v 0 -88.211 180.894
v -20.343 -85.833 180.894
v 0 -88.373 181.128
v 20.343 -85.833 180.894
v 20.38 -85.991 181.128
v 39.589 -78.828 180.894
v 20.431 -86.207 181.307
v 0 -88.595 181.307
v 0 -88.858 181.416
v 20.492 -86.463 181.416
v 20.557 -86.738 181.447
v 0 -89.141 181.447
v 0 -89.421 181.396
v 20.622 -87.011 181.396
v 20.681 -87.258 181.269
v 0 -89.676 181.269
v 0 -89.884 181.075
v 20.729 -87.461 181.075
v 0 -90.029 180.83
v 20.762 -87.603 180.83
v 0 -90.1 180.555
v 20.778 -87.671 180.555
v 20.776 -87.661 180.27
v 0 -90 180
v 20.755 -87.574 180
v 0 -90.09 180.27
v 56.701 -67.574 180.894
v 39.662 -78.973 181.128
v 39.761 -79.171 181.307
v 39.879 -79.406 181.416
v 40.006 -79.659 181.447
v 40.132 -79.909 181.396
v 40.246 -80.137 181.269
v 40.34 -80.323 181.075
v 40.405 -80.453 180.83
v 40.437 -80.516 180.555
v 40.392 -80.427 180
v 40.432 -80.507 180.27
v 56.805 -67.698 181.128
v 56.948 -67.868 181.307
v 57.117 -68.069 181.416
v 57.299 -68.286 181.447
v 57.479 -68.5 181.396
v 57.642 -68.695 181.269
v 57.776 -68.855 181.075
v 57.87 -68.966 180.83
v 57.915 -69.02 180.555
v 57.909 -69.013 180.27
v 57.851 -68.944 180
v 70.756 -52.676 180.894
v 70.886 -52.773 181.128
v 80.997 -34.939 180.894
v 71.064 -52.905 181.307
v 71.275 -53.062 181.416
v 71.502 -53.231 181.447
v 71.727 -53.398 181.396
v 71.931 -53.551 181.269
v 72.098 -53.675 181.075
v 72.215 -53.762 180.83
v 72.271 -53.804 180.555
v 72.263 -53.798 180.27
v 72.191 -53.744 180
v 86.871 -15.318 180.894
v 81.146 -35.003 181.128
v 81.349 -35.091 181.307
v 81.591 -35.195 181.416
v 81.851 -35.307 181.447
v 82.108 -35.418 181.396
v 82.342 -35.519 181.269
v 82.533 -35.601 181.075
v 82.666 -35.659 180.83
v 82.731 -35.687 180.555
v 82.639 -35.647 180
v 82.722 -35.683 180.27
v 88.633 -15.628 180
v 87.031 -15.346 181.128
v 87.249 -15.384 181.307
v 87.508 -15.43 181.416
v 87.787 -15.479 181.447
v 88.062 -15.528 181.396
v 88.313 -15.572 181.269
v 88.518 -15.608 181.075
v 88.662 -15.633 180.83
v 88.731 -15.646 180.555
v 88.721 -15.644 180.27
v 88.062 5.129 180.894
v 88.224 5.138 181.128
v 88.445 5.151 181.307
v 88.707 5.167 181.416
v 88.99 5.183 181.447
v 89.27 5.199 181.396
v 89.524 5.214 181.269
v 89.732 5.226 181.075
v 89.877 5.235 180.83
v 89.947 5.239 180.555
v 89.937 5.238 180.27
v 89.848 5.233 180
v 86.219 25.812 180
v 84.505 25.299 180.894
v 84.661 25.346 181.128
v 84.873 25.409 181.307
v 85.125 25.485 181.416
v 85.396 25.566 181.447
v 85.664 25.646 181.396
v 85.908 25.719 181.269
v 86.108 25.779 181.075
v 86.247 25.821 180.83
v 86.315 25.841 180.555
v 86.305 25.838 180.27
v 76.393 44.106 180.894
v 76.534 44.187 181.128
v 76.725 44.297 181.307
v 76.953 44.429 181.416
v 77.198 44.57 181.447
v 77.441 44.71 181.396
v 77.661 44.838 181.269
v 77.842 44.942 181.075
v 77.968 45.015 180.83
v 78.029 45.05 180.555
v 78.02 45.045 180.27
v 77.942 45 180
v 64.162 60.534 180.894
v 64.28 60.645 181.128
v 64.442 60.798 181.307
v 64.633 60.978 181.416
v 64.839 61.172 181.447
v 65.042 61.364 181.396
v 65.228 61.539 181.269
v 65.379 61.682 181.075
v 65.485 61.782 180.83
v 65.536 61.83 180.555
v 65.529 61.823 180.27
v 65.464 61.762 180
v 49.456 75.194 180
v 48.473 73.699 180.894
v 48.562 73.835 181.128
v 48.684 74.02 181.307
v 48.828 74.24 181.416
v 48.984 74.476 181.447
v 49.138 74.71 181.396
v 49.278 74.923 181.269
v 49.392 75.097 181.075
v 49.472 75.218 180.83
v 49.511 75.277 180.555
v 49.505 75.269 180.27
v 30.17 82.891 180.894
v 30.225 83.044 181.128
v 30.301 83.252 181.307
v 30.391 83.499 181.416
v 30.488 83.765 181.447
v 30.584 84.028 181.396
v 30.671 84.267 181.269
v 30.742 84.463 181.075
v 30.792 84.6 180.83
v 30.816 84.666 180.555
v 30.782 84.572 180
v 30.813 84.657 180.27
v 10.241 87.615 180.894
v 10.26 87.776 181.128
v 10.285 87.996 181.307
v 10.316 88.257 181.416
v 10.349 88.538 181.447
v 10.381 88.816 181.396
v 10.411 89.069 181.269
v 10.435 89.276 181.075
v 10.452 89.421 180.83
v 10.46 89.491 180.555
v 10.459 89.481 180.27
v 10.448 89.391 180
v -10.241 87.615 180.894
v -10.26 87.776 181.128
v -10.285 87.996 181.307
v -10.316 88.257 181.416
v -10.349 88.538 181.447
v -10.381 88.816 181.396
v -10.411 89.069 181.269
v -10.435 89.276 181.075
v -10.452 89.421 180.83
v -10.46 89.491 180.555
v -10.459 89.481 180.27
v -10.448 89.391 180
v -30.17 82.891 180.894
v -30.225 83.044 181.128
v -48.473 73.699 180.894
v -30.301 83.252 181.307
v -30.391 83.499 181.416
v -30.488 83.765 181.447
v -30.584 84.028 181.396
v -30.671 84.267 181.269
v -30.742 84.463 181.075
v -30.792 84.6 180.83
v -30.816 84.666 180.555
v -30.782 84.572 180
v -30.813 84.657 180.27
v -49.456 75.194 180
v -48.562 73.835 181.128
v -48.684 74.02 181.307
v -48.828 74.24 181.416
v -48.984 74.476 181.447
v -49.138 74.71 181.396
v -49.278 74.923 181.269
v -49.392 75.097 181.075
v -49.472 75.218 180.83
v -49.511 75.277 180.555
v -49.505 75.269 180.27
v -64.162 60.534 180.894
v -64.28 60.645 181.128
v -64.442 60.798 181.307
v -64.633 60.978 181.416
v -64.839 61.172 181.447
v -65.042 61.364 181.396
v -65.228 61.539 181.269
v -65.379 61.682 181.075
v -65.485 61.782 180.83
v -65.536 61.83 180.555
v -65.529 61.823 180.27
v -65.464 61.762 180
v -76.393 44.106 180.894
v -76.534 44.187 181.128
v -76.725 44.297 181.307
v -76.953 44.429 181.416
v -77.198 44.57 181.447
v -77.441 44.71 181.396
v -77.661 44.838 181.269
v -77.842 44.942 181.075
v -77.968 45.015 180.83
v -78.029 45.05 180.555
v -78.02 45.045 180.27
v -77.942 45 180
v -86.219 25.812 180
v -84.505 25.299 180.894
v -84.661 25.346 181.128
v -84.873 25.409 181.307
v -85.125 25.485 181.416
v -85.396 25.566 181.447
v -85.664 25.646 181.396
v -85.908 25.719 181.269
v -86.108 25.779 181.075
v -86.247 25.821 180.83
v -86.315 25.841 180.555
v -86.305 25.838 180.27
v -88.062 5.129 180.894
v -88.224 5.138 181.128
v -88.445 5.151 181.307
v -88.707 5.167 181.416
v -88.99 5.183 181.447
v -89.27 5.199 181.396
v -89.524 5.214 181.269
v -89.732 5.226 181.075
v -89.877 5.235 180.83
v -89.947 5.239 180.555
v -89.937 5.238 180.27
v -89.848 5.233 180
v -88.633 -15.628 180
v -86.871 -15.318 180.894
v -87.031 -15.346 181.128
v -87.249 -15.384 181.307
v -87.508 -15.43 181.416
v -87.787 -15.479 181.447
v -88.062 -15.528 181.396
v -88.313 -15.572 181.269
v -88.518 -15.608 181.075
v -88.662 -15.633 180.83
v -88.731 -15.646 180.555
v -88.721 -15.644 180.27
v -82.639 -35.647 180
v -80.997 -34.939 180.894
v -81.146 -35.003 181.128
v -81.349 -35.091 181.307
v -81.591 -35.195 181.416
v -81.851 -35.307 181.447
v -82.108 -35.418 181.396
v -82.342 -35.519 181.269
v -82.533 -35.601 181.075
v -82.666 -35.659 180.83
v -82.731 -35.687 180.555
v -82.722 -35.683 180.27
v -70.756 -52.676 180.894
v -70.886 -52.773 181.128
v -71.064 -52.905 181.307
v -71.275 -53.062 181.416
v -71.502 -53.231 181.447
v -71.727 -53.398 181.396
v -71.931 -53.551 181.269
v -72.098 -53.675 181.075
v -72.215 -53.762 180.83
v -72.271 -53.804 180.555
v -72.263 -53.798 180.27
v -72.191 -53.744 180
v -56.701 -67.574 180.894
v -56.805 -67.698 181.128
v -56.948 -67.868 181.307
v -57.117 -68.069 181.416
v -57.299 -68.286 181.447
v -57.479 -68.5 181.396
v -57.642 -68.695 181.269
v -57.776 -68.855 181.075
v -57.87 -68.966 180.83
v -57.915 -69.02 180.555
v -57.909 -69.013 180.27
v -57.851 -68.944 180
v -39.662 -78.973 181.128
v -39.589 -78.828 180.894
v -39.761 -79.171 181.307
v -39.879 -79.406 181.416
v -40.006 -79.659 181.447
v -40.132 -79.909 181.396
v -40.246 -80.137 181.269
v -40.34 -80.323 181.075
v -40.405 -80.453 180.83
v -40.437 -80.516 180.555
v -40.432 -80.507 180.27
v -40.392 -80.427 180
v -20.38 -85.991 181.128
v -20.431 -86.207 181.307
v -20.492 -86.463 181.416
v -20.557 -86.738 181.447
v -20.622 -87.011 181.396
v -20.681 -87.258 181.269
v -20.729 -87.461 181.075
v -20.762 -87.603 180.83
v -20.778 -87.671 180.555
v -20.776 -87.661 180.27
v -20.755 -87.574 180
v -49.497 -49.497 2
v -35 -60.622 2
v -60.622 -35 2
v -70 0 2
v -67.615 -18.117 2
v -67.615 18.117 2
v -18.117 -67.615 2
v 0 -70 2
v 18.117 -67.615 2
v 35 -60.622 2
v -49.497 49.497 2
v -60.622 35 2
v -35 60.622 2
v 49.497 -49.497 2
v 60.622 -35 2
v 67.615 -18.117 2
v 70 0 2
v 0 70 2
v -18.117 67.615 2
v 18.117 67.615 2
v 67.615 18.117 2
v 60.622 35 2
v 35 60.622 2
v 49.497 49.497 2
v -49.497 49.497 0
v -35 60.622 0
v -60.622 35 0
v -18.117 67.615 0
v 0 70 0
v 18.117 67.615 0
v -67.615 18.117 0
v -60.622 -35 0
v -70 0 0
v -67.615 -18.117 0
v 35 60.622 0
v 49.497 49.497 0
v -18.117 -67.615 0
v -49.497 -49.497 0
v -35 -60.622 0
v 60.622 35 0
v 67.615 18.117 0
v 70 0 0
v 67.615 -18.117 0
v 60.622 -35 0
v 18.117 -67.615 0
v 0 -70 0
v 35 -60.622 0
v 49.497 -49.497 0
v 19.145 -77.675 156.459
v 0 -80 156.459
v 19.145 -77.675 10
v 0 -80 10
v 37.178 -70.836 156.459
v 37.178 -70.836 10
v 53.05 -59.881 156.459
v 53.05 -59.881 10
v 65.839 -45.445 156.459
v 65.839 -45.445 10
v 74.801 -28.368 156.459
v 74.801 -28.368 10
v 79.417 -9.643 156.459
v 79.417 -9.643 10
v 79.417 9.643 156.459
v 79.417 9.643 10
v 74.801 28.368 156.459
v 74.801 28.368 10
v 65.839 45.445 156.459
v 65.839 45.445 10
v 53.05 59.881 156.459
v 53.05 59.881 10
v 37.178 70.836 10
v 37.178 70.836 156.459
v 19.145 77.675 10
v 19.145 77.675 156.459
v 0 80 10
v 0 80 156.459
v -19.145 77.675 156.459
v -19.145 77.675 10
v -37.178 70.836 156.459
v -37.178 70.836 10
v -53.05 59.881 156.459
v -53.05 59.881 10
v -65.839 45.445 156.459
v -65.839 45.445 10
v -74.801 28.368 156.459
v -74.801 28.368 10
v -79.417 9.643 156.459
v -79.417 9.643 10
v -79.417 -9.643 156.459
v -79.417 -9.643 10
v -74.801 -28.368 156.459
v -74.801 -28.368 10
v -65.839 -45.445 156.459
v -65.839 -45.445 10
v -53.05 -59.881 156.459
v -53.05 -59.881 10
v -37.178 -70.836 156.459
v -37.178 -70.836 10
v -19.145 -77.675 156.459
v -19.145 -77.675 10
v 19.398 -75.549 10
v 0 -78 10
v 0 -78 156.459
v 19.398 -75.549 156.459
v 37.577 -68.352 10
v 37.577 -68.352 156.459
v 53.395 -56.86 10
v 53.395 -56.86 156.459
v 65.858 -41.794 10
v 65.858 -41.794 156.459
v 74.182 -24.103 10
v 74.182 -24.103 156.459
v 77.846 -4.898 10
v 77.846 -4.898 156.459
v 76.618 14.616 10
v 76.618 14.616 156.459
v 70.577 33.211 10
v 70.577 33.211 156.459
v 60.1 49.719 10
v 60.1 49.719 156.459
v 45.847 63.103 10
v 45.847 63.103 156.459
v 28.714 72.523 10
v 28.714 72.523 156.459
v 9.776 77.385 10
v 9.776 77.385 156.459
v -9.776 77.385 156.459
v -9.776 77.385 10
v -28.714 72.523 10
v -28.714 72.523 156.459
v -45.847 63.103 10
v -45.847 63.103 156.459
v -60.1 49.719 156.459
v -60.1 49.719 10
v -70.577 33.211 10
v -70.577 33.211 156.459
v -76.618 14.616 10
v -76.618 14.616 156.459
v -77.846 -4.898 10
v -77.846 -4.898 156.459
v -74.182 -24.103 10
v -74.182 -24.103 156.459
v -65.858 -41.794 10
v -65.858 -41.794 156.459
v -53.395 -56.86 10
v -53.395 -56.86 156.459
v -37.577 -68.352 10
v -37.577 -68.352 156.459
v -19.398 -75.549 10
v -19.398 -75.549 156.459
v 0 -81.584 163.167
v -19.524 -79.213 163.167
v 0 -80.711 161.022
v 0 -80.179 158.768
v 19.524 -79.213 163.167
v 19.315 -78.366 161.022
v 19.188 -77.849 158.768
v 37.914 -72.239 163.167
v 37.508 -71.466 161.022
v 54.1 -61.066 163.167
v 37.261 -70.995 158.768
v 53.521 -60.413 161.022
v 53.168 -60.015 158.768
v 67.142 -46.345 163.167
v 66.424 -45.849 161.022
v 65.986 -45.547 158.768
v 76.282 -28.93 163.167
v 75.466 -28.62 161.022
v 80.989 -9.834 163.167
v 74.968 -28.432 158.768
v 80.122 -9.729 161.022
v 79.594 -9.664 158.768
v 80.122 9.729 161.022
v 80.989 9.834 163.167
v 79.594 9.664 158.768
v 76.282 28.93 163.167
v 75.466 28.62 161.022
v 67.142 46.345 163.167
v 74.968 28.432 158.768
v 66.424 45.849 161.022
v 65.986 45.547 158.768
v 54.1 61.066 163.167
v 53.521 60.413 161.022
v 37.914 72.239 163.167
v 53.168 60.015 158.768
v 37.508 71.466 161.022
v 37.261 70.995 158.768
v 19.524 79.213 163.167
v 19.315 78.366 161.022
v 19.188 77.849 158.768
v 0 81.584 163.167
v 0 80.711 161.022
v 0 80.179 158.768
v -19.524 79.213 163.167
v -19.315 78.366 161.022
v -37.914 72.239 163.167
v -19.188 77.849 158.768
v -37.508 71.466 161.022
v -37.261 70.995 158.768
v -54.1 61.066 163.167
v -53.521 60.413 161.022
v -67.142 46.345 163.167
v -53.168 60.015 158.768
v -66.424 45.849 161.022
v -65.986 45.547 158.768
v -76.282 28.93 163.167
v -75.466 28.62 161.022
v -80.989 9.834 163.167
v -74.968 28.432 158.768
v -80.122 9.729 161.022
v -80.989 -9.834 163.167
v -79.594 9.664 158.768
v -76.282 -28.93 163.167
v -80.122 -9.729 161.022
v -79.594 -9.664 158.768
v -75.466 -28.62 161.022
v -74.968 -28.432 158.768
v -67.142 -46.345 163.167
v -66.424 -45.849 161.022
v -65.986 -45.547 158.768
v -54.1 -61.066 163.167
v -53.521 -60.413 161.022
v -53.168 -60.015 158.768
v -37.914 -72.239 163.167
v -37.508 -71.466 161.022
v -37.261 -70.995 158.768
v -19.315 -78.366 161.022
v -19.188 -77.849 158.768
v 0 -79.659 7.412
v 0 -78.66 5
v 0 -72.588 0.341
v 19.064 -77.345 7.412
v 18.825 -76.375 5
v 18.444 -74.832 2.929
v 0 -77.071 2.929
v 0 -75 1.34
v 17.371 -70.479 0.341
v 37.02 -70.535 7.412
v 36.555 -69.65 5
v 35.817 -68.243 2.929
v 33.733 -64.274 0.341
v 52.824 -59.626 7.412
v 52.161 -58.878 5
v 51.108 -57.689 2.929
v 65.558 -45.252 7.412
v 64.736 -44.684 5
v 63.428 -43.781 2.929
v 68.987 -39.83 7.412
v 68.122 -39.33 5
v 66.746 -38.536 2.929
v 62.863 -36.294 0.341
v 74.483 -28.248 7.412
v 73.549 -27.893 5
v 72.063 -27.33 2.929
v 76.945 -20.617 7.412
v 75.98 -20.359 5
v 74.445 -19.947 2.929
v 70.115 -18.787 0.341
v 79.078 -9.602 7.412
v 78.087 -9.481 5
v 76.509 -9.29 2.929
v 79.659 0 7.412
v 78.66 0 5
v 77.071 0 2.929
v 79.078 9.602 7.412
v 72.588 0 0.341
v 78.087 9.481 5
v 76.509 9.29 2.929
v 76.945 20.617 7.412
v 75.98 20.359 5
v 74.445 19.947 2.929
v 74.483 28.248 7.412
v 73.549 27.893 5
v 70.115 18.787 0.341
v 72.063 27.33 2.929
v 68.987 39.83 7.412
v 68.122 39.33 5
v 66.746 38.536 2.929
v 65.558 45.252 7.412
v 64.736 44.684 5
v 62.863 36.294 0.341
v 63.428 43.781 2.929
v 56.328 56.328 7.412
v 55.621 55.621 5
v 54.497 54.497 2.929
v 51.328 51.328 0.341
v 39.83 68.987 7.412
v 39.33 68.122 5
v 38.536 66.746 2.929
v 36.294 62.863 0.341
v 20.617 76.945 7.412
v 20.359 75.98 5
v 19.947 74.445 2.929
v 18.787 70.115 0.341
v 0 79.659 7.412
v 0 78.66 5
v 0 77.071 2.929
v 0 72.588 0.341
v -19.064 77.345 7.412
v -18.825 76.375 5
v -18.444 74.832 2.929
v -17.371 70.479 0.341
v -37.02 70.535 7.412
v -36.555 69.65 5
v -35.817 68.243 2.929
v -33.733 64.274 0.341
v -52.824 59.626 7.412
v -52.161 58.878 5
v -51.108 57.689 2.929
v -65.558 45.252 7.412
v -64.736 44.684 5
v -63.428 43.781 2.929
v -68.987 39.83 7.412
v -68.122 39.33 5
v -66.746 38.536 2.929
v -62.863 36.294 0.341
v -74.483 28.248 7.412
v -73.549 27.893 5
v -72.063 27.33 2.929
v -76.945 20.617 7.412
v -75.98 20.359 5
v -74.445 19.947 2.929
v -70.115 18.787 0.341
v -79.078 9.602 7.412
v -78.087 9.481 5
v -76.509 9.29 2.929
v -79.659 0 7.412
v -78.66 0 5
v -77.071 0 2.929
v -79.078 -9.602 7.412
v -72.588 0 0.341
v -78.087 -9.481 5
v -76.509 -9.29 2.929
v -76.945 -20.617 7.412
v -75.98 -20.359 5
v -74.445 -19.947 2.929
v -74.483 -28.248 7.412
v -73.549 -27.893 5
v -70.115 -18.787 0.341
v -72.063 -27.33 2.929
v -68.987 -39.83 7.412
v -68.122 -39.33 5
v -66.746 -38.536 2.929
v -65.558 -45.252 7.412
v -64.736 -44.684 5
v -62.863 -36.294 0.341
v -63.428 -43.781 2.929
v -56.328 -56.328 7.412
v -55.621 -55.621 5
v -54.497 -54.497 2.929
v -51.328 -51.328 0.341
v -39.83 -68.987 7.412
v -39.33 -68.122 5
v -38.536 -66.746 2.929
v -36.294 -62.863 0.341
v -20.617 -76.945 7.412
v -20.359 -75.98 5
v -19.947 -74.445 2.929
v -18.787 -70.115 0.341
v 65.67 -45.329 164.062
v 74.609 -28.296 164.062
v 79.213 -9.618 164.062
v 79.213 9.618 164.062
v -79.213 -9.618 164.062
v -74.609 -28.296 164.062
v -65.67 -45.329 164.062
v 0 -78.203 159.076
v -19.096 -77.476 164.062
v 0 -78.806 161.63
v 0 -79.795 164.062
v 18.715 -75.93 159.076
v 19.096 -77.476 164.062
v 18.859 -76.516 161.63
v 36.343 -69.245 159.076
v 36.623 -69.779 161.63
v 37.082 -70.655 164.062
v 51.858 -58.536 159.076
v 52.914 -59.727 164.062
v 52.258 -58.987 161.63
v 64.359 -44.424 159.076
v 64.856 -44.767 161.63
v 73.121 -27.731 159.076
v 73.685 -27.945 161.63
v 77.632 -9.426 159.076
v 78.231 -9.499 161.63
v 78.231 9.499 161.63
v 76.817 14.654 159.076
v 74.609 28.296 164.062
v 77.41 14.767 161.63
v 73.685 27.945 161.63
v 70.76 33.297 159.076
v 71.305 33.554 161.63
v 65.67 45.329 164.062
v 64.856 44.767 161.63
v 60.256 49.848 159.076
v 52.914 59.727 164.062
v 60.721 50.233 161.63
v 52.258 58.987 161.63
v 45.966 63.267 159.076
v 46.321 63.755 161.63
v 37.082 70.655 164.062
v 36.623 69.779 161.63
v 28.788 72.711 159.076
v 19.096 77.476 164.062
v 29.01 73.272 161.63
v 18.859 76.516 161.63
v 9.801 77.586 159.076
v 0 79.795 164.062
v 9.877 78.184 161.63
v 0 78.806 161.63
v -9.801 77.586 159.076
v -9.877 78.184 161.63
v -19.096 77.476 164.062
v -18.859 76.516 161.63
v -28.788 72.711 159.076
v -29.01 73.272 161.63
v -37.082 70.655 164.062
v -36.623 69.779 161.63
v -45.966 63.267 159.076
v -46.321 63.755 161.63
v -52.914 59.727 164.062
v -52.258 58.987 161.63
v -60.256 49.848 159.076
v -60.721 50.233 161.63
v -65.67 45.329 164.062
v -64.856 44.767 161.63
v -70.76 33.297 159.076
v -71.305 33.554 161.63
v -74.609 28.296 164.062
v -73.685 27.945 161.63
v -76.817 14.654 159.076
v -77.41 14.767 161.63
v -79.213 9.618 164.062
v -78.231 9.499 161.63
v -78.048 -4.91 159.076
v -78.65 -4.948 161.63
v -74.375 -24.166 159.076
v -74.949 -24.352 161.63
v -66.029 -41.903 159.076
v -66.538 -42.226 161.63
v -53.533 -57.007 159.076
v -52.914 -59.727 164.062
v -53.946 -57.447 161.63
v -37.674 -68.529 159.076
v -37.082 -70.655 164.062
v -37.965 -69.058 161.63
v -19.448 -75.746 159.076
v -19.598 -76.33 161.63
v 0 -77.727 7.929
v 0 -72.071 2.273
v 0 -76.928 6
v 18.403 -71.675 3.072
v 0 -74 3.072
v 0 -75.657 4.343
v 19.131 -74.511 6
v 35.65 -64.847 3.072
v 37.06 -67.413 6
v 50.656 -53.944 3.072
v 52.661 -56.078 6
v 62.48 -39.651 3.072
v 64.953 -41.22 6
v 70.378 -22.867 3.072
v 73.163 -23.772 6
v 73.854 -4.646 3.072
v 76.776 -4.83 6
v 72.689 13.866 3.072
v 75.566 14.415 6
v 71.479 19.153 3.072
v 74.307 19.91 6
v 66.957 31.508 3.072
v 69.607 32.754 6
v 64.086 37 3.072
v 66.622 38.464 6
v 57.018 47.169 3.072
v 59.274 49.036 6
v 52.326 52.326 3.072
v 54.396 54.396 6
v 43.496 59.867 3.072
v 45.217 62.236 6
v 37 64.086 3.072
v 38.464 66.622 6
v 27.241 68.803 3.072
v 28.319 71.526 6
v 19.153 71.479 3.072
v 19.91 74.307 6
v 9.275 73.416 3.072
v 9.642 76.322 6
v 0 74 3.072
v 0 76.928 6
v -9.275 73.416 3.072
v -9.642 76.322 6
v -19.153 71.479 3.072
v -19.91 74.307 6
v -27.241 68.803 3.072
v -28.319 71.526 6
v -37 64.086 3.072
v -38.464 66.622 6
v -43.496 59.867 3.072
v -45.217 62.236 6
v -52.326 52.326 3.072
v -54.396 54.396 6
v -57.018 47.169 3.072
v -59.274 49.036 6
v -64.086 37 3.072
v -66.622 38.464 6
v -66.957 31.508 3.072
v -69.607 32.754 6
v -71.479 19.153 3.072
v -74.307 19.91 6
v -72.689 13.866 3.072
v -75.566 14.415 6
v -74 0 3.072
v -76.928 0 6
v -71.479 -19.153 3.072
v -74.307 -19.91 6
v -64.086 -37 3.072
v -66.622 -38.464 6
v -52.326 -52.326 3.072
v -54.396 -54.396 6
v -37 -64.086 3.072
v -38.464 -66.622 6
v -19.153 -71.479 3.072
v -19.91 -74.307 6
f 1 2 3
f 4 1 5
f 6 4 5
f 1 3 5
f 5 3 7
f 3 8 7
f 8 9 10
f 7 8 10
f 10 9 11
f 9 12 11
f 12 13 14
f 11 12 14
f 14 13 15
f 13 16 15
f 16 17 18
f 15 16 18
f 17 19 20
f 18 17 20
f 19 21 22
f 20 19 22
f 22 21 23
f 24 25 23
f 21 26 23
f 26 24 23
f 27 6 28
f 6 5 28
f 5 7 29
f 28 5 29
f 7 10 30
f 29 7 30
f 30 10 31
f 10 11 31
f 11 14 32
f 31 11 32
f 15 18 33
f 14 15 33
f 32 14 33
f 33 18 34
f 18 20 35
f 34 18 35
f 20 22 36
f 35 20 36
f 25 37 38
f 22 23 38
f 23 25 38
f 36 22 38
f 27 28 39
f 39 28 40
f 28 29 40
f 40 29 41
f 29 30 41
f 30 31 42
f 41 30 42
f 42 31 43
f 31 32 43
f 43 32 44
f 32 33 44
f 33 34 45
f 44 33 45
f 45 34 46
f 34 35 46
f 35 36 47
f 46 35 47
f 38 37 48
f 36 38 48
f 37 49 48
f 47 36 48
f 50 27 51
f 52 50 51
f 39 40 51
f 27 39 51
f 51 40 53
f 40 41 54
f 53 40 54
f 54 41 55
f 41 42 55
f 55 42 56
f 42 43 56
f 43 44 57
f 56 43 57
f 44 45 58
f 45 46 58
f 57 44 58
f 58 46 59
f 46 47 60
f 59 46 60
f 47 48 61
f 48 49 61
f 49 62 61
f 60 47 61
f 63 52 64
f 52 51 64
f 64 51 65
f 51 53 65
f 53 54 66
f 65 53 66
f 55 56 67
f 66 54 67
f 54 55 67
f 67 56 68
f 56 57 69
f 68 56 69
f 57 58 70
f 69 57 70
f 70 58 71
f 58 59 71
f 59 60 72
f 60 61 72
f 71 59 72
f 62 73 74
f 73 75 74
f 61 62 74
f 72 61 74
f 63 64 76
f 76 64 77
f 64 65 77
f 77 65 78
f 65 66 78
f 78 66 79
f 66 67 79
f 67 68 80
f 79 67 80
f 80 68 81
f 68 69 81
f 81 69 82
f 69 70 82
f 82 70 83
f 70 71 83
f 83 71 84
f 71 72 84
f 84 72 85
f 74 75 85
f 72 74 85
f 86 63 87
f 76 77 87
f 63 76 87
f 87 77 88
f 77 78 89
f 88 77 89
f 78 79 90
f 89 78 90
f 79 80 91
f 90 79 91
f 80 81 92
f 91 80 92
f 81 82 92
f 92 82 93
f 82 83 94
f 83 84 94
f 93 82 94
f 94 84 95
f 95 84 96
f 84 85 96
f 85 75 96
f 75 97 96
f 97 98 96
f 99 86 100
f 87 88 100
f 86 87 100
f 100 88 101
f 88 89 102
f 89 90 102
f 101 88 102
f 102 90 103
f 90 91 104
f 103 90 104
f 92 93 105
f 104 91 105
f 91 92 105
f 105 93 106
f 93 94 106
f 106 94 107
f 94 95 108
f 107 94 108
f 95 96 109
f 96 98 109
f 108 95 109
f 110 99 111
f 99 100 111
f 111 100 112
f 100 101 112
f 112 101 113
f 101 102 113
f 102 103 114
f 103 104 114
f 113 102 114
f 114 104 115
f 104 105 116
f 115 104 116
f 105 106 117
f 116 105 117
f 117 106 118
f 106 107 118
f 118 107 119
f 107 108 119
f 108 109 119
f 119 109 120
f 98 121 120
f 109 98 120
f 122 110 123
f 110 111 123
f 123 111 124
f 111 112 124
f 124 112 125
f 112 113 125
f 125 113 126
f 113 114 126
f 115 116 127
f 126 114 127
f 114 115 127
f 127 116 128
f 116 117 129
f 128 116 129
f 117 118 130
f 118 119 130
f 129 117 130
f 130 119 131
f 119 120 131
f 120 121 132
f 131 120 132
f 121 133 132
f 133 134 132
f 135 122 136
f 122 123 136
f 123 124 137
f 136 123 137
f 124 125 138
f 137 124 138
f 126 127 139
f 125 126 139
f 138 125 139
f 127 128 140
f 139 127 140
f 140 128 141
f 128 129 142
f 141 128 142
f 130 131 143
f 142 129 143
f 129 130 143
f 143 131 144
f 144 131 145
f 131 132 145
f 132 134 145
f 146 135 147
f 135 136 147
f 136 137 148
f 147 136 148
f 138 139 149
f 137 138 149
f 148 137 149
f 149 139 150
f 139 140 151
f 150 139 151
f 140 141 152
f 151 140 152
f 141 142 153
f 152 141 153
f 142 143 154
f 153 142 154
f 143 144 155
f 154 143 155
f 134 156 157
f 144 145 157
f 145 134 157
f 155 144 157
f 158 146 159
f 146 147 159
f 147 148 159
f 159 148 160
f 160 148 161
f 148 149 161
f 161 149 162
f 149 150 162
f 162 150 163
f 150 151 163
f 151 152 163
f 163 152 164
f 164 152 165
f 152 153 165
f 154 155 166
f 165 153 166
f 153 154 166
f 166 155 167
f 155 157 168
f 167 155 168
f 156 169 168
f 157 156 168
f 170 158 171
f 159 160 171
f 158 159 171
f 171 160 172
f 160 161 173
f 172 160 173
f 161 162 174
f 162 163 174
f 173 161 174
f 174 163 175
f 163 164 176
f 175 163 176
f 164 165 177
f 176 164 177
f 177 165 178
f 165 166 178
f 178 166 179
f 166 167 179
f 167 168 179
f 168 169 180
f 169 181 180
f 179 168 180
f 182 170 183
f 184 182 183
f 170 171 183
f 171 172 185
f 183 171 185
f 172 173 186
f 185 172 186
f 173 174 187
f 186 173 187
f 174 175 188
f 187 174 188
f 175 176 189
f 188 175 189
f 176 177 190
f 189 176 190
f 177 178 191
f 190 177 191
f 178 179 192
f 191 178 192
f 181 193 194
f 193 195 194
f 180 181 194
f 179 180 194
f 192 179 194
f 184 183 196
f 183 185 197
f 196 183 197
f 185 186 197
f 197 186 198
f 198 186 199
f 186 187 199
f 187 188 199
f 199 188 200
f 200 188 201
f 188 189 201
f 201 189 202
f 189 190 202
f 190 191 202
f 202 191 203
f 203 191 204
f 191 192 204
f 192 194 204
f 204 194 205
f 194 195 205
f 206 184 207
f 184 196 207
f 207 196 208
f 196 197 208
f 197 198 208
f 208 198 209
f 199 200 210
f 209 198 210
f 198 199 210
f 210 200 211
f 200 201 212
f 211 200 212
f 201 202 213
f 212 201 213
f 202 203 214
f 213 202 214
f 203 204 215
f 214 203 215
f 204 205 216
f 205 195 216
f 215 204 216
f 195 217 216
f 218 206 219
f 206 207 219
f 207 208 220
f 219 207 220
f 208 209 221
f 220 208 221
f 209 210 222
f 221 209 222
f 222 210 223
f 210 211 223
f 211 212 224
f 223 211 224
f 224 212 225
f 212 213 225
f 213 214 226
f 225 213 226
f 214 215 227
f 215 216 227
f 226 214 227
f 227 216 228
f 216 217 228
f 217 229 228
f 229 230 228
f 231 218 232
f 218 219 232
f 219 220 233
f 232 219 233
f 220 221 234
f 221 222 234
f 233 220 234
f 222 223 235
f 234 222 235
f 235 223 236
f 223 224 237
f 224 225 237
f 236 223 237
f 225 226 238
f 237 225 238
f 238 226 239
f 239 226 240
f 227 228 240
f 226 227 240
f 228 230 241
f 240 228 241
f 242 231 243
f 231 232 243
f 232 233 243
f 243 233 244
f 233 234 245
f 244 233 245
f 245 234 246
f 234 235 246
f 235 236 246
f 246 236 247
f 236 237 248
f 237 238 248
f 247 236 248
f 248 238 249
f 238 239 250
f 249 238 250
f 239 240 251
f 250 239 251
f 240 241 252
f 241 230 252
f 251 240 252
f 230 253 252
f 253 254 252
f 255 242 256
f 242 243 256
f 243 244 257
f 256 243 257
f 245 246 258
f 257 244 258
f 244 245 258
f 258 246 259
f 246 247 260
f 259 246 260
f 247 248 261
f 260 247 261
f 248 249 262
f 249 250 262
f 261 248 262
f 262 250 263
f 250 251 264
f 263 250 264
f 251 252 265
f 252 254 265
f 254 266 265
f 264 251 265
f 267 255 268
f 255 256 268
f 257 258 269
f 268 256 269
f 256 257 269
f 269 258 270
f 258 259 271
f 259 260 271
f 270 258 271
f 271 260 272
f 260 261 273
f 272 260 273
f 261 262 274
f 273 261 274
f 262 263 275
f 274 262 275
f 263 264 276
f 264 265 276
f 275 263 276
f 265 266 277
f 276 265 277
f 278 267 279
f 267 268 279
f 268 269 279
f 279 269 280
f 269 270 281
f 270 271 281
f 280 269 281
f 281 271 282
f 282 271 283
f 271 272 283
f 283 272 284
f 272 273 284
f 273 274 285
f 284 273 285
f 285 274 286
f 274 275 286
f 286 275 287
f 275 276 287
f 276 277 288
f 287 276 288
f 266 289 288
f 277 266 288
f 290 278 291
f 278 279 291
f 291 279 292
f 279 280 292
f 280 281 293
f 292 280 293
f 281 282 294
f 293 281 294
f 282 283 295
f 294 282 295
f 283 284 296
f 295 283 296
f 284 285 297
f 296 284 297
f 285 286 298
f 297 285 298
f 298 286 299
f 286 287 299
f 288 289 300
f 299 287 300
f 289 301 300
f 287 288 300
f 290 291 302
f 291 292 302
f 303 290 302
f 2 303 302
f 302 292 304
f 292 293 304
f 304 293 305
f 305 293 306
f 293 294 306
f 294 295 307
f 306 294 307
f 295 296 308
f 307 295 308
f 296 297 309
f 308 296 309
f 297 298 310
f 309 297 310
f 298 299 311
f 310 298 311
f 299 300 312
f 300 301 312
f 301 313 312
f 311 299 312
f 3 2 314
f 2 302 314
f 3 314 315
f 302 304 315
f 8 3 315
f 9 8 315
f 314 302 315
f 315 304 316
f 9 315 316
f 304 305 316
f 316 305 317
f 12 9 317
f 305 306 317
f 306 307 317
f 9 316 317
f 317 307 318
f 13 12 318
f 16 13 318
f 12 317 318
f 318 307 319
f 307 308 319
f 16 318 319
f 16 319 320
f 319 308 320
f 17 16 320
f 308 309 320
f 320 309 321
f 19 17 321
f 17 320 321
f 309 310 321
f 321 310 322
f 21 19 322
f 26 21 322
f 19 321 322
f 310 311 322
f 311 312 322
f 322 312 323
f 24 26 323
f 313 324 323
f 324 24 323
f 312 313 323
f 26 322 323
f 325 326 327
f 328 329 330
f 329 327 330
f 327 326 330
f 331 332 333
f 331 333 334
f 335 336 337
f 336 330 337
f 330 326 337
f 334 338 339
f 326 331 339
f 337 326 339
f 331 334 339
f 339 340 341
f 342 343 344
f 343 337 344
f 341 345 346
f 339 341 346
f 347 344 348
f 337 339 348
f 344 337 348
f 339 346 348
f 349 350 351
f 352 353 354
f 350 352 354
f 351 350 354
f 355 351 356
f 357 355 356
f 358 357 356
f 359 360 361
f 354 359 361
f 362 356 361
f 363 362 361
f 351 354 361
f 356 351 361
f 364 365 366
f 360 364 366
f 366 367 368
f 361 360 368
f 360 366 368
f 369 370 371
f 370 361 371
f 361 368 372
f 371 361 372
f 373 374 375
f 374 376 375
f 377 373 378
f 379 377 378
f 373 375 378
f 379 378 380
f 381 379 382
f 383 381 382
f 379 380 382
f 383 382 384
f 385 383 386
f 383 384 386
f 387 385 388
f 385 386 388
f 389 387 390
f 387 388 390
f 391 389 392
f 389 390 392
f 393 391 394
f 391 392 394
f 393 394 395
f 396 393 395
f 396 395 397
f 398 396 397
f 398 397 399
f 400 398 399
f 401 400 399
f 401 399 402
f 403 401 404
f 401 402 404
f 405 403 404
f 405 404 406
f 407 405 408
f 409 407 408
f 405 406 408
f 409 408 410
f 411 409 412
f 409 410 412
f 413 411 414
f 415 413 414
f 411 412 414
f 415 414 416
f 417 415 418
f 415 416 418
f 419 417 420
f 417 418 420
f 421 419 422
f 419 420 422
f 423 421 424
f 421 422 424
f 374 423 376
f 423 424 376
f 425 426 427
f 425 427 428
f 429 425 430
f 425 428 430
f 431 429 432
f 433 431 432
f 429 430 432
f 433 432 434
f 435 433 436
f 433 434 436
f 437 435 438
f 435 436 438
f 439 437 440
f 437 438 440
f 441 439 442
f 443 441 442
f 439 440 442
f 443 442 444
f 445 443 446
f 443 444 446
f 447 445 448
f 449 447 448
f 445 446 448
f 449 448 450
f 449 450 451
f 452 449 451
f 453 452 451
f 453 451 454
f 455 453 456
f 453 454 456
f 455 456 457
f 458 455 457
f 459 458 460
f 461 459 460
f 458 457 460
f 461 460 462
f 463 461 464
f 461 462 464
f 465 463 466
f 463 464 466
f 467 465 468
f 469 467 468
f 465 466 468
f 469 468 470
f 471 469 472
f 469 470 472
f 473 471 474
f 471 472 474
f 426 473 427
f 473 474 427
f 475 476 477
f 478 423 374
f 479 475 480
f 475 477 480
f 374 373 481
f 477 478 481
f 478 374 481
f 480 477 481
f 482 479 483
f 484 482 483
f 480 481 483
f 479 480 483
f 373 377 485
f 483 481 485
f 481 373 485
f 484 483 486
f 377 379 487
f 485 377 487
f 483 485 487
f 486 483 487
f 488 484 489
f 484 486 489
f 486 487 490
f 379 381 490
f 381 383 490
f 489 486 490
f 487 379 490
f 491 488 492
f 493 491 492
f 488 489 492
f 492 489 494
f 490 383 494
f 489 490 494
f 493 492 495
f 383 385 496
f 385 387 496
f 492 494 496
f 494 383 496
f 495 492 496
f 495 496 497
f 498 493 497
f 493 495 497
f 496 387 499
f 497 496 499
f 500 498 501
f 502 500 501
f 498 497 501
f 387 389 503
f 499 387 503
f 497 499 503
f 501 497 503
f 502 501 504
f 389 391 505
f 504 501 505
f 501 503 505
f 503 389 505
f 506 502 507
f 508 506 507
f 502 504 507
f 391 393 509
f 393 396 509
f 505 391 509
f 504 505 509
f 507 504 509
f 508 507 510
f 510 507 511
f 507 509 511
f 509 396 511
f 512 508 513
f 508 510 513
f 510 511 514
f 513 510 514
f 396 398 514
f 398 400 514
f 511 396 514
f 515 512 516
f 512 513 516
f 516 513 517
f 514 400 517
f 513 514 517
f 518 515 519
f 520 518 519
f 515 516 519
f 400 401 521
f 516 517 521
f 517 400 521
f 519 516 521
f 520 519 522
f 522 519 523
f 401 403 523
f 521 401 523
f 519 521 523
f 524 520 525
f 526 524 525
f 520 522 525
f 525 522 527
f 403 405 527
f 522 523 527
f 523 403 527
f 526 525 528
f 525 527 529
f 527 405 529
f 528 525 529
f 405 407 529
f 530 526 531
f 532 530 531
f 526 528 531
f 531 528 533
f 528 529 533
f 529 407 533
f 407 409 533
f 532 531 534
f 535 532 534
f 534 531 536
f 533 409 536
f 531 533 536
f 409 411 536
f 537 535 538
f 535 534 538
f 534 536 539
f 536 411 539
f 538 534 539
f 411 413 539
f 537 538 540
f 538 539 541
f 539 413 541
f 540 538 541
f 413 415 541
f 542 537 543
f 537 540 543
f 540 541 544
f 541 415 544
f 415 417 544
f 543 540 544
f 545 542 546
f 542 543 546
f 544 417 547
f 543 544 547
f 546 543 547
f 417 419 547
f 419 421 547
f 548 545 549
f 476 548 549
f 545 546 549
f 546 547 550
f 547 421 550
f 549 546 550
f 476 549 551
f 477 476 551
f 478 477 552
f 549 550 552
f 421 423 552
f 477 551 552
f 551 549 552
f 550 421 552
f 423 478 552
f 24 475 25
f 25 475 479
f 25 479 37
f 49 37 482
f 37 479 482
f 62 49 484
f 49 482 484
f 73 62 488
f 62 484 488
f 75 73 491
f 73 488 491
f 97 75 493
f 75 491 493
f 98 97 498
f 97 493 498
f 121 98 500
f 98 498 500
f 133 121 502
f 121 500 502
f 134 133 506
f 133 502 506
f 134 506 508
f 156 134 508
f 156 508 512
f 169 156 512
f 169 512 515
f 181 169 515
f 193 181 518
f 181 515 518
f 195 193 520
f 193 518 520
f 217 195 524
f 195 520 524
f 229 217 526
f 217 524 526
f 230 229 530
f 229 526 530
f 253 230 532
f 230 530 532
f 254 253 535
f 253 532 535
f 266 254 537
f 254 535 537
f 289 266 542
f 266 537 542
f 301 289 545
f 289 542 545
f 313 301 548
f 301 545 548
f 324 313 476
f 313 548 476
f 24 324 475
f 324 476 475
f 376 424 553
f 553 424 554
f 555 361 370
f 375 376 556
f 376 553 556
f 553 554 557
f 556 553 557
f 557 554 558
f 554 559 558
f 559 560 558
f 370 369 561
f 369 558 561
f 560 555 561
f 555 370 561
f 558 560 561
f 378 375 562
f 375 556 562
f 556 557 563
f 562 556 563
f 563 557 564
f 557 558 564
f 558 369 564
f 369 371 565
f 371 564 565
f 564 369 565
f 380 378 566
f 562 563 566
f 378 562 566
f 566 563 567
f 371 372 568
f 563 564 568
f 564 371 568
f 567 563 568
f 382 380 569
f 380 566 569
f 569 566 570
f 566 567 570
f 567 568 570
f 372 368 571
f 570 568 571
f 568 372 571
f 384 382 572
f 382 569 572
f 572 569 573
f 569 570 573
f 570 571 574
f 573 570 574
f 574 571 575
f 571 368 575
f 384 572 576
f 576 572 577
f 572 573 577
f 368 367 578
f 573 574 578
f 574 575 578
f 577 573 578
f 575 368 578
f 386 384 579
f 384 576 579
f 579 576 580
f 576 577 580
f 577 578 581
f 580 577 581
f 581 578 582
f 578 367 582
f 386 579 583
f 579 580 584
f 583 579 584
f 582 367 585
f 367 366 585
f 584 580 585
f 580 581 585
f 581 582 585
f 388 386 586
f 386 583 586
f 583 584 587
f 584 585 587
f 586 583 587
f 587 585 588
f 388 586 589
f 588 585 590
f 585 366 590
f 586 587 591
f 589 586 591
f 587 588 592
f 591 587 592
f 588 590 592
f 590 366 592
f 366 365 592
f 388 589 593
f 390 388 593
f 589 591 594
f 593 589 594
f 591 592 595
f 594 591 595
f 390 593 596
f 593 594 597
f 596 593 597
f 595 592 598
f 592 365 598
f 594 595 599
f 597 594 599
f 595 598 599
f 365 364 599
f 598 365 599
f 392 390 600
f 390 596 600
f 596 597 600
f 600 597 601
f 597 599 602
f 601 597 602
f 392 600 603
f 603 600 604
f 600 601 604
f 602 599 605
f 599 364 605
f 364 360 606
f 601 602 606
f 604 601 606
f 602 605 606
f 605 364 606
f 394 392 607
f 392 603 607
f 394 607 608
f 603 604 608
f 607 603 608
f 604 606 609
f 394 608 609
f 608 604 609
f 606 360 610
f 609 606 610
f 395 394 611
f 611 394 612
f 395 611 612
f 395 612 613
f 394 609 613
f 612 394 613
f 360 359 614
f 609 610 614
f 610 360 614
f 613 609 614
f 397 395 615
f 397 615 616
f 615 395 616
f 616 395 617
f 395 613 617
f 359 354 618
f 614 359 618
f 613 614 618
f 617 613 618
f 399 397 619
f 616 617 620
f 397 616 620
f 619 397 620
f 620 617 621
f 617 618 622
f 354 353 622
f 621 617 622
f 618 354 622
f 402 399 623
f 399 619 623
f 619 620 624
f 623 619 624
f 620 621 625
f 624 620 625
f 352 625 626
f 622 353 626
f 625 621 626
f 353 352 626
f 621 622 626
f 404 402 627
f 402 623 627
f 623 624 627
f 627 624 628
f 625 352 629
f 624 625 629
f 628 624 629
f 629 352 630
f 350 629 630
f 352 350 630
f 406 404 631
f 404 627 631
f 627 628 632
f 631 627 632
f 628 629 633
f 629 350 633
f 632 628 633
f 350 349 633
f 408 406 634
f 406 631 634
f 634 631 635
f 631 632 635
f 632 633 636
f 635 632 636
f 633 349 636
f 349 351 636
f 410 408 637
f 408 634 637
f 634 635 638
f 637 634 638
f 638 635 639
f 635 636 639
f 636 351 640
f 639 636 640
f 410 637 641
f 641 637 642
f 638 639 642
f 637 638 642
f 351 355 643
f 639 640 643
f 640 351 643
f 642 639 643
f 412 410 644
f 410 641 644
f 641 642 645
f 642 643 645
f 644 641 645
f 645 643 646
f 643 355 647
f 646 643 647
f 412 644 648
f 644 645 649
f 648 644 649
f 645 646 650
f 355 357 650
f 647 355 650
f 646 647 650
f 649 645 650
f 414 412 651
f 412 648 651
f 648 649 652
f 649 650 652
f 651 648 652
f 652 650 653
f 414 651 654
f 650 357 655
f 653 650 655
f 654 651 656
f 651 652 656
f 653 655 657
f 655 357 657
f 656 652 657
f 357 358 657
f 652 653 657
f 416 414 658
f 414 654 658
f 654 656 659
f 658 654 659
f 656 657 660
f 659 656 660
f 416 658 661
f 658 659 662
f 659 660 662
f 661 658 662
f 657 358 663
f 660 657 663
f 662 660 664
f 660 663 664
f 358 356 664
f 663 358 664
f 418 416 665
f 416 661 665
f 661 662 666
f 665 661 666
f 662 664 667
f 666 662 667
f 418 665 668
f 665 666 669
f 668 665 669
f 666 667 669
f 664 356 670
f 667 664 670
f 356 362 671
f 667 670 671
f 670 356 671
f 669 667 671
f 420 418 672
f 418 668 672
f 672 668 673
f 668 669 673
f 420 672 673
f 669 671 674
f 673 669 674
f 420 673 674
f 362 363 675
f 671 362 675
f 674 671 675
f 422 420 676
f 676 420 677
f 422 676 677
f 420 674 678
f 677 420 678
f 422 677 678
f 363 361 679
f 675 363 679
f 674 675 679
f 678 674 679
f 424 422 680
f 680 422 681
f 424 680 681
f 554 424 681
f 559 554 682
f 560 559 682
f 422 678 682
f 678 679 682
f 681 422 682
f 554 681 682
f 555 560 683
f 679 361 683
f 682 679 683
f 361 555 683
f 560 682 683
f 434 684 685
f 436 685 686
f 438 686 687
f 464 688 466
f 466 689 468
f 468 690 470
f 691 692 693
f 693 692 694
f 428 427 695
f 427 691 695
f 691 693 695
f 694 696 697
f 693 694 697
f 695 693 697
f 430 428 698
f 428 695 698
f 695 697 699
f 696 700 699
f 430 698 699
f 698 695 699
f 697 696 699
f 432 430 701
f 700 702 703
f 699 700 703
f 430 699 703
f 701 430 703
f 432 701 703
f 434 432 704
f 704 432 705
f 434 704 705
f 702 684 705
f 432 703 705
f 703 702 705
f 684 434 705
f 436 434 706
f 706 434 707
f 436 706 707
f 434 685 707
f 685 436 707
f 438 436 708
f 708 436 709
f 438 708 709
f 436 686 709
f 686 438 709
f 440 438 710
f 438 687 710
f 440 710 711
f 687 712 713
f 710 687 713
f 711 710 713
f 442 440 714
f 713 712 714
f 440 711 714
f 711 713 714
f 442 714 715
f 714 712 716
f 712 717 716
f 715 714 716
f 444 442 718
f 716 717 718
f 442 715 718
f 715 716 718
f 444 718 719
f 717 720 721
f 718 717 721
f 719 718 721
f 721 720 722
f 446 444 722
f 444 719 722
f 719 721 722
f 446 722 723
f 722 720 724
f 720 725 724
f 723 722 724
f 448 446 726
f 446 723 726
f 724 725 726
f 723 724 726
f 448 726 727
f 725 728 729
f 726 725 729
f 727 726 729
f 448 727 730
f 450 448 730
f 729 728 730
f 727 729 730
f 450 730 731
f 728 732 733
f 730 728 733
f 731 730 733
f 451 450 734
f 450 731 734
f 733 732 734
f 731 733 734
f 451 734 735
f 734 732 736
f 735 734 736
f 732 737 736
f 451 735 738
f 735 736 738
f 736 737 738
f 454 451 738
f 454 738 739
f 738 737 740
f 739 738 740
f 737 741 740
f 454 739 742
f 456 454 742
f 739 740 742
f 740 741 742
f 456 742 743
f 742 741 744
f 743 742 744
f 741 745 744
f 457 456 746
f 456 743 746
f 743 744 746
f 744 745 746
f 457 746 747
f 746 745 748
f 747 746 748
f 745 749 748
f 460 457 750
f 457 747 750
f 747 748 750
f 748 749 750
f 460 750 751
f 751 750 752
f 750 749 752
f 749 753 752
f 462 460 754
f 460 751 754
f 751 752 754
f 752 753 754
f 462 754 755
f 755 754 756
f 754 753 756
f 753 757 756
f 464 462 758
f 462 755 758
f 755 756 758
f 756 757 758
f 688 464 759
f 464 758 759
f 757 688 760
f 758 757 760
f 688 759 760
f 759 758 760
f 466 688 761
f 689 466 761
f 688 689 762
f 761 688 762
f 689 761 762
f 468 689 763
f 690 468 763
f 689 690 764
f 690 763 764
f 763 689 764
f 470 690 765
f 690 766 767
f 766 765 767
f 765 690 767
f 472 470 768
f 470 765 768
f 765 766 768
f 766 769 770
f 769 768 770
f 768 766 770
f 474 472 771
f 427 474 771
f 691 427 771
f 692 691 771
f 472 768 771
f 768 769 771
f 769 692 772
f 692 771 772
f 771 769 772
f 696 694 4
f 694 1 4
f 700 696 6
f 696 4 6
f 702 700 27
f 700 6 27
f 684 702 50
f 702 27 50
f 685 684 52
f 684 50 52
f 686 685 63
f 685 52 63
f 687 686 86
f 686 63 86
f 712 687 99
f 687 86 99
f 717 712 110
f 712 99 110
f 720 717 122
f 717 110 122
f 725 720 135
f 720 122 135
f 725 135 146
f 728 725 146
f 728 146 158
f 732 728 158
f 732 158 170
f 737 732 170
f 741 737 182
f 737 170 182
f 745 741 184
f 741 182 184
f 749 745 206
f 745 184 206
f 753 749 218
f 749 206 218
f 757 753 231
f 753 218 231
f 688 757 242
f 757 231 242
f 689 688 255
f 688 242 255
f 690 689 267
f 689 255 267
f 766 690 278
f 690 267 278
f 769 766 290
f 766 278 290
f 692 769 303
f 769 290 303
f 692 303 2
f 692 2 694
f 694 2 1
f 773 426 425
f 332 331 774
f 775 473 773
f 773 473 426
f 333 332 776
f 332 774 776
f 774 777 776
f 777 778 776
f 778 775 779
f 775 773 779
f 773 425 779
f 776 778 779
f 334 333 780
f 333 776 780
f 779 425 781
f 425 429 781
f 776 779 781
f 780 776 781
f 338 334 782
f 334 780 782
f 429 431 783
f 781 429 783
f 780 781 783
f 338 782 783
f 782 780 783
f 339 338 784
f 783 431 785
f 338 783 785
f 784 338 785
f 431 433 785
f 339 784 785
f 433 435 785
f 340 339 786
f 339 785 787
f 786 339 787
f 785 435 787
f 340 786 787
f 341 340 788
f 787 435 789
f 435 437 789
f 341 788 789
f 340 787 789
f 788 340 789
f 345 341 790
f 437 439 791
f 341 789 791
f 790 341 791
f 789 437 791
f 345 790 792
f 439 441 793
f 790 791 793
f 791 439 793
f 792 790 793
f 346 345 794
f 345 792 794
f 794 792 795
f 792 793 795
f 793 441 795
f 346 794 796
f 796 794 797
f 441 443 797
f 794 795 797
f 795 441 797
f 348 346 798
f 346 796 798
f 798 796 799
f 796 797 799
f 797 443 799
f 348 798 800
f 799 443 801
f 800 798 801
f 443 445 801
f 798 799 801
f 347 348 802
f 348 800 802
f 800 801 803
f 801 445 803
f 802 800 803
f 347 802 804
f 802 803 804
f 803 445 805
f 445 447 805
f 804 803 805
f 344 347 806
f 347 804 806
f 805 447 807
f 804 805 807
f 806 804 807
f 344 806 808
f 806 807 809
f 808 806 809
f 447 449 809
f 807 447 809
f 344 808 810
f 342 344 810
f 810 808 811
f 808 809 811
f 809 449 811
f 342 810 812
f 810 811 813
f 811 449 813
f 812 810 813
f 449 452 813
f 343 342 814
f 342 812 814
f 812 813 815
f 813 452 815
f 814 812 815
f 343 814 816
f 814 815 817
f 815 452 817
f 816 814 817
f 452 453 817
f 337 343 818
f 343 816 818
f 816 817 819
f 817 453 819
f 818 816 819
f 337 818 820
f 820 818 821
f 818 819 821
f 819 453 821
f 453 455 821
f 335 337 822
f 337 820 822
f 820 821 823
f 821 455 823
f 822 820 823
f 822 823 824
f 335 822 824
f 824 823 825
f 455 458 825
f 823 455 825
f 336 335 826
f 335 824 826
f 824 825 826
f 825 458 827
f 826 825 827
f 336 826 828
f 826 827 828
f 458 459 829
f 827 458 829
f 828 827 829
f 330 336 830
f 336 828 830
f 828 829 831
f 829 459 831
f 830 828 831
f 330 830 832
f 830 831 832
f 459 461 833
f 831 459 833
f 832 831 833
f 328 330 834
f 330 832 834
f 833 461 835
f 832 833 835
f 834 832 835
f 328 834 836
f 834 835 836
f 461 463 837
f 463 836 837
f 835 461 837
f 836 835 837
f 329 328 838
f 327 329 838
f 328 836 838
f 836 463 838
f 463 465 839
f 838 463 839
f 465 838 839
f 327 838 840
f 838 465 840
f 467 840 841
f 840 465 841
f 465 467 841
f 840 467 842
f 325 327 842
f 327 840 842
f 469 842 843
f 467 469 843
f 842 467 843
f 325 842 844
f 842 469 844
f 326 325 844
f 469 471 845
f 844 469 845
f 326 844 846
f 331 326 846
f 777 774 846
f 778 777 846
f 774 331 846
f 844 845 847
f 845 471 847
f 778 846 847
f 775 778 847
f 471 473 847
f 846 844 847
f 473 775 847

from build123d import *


with BuildPart() as f1:
    # F0 (on Right) → F1 (revolve)
    with BuildSketch(Plane.YZ):
        with BuildLine():
            Line((-70, 0), (0, 0))
            Line((0, 0), (0, 2))
            Line((0, 2), (-70, 2))
            ThreePointArc((-70, 2), (-75.656854, 4.343146), (-78, 10))
            Line((-78, 10), (-78, 156.45898))
            ThreePointArc((-78, 156.45898), (-78.454767, 160.36478), (-79.794738, 164.061611))
            Line((-79.794738, 164.061611), (-88.211146, 180.894427))
            ThreePointArc((-88.211146, 180.894427), (-89.552786, 181.341641), (-90, 180))
            Line((-90, 180), (-81.583592, 163.167184))
            ThreePointArc((-81.583592, 163.167184), (-80.401265, 159.905274), (-80, 156.45898))
            Line((-80, 156.45898), (-80, 10))
            ThreePointArc((-80, 10), (-77.071068, 2.928932), (-70, 0))
        make_face()
    revolve(axis=Axis((0, 0, 41.621631), (0, 0, 1)))


solid = f1.part
